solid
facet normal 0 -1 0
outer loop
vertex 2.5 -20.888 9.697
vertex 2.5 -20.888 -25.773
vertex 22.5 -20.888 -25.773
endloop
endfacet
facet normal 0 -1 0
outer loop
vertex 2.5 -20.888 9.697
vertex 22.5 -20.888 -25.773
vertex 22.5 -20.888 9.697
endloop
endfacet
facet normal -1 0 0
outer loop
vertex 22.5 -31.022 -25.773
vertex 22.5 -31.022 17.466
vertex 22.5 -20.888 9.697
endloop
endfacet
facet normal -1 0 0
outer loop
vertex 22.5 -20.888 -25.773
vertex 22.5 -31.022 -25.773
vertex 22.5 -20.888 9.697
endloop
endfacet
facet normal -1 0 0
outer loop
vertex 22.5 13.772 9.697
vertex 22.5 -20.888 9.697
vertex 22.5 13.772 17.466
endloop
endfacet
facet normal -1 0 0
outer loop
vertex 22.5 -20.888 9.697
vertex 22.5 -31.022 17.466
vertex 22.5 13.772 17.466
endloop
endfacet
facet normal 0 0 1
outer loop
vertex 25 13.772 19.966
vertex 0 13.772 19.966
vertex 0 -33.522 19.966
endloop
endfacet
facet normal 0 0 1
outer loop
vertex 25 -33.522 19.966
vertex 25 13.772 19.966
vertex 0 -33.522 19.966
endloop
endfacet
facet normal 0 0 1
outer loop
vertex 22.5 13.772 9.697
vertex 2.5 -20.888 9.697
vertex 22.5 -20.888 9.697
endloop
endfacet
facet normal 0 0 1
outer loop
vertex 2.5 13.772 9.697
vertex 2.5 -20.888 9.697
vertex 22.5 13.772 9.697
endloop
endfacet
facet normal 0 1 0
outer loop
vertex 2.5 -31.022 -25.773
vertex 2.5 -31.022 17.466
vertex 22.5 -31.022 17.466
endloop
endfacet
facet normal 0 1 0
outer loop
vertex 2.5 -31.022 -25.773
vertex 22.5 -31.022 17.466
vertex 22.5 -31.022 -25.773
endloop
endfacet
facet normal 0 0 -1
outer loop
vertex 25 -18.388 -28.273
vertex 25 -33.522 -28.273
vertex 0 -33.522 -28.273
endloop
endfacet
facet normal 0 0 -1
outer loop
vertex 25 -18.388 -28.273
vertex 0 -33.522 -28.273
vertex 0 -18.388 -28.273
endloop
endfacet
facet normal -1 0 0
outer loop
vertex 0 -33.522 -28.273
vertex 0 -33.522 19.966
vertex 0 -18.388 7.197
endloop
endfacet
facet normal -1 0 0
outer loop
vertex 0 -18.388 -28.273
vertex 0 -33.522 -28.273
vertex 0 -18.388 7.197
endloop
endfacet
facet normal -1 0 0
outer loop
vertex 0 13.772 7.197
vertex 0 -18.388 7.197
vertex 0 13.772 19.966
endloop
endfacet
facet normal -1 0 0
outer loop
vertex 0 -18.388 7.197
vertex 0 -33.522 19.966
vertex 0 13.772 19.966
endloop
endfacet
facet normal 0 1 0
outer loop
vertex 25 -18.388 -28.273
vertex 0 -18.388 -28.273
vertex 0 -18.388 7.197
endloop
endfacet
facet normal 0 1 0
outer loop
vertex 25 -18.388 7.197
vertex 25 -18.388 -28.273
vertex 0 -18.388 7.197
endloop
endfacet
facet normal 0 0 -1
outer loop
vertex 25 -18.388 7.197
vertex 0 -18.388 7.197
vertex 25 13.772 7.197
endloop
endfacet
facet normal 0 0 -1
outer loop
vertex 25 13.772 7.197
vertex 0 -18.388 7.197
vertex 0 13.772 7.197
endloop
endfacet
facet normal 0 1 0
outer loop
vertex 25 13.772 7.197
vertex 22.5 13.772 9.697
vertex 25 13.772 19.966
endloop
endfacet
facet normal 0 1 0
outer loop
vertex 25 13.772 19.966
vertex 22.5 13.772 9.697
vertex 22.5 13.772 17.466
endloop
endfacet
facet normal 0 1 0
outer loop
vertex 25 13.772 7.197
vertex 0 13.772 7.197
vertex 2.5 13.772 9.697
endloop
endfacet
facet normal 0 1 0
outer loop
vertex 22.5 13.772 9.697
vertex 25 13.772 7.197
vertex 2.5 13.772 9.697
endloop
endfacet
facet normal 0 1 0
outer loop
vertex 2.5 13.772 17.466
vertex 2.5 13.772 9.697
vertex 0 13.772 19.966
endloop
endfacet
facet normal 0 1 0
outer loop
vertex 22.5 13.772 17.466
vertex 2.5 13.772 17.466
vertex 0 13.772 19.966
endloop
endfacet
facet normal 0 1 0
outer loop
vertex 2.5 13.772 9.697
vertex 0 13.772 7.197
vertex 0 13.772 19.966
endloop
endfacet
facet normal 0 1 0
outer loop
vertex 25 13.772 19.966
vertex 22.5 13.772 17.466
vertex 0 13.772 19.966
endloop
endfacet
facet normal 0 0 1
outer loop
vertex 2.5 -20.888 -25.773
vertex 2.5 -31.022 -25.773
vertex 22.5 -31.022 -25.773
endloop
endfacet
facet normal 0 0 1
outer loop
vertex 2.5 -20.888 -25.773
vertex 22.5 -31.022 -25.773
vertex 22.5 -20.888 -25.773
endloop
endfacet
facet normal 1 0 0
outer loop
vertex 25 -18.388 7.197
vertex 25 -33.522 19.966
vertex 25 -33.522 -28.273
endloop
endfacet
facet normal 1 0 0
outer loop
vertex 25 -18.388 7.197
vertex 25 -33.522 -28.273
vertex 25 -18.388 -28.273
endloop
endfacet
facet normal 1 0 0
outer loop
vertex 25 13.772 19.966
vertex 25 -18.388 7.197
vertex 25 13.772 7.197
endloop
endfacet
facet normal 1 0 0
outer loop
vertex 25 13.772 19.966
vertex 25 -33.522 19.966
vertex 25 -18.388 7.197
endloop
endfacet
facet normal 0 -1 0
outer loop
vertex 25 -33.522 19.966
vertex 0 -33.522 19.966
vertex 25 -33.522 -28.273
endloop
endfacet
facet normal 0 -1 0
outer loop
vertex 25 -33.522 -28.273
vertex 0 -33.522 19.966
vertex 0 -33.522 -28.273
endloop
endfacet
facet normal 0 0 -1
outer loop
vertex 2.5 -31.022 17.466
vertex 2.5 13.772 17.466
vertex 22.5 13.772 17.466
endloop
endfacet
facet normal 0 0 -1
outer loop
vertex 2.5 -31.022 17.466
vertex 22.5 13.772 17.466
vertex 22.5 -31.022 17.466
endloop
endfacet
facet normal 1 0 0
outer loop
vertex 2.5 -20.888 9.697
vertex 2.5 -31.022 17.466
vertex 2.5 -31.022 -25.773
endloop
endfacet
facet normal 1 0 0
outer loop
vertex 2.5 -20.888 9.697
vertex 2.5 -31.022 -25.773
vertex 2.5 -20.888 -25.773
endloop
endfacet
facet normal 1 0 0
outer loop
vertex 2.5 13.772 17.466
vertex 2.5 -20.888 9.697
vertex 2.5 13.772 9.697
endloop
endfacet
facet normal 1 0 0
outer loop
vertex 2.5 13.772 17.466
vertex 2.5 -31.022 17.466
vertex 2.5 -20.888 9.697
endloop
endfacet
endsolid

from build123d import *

# Parameters (mm, degrees)
F0_W     = 32.1596805006
F0_H     = 12.7692851238
F1_DEPTH = 25
F2_T     = -2.5


with BuildPart() as f1:
    # F0 (on Right) → F1 (new body)
    with BuildSketch(Plane.YZ):
        with Locations((-2.3078126833, 13.5815928224)):
            Rectangle(F0_W, F0_H)
        Polygon((-18.3876529336, 19.9662353843), (-33.5216186941, 19.9662353843), (-33.5216186941, -28.2732862979), (-18.3876529336, -28.2732862979), (-18.3876529336, 7.1969502605), align=None)
    extrude(amount=F1_DEPTH)

    # F2
    f2_openings = [f1.faces().sort_by_distance(p)[0] for p in [
        (12.5, 13.772028, 13.581593),
    ]]
    offset(amount=F2_T, openings=f2_openings, kind=Kind.INTERSECTION)


solid = f1.part
